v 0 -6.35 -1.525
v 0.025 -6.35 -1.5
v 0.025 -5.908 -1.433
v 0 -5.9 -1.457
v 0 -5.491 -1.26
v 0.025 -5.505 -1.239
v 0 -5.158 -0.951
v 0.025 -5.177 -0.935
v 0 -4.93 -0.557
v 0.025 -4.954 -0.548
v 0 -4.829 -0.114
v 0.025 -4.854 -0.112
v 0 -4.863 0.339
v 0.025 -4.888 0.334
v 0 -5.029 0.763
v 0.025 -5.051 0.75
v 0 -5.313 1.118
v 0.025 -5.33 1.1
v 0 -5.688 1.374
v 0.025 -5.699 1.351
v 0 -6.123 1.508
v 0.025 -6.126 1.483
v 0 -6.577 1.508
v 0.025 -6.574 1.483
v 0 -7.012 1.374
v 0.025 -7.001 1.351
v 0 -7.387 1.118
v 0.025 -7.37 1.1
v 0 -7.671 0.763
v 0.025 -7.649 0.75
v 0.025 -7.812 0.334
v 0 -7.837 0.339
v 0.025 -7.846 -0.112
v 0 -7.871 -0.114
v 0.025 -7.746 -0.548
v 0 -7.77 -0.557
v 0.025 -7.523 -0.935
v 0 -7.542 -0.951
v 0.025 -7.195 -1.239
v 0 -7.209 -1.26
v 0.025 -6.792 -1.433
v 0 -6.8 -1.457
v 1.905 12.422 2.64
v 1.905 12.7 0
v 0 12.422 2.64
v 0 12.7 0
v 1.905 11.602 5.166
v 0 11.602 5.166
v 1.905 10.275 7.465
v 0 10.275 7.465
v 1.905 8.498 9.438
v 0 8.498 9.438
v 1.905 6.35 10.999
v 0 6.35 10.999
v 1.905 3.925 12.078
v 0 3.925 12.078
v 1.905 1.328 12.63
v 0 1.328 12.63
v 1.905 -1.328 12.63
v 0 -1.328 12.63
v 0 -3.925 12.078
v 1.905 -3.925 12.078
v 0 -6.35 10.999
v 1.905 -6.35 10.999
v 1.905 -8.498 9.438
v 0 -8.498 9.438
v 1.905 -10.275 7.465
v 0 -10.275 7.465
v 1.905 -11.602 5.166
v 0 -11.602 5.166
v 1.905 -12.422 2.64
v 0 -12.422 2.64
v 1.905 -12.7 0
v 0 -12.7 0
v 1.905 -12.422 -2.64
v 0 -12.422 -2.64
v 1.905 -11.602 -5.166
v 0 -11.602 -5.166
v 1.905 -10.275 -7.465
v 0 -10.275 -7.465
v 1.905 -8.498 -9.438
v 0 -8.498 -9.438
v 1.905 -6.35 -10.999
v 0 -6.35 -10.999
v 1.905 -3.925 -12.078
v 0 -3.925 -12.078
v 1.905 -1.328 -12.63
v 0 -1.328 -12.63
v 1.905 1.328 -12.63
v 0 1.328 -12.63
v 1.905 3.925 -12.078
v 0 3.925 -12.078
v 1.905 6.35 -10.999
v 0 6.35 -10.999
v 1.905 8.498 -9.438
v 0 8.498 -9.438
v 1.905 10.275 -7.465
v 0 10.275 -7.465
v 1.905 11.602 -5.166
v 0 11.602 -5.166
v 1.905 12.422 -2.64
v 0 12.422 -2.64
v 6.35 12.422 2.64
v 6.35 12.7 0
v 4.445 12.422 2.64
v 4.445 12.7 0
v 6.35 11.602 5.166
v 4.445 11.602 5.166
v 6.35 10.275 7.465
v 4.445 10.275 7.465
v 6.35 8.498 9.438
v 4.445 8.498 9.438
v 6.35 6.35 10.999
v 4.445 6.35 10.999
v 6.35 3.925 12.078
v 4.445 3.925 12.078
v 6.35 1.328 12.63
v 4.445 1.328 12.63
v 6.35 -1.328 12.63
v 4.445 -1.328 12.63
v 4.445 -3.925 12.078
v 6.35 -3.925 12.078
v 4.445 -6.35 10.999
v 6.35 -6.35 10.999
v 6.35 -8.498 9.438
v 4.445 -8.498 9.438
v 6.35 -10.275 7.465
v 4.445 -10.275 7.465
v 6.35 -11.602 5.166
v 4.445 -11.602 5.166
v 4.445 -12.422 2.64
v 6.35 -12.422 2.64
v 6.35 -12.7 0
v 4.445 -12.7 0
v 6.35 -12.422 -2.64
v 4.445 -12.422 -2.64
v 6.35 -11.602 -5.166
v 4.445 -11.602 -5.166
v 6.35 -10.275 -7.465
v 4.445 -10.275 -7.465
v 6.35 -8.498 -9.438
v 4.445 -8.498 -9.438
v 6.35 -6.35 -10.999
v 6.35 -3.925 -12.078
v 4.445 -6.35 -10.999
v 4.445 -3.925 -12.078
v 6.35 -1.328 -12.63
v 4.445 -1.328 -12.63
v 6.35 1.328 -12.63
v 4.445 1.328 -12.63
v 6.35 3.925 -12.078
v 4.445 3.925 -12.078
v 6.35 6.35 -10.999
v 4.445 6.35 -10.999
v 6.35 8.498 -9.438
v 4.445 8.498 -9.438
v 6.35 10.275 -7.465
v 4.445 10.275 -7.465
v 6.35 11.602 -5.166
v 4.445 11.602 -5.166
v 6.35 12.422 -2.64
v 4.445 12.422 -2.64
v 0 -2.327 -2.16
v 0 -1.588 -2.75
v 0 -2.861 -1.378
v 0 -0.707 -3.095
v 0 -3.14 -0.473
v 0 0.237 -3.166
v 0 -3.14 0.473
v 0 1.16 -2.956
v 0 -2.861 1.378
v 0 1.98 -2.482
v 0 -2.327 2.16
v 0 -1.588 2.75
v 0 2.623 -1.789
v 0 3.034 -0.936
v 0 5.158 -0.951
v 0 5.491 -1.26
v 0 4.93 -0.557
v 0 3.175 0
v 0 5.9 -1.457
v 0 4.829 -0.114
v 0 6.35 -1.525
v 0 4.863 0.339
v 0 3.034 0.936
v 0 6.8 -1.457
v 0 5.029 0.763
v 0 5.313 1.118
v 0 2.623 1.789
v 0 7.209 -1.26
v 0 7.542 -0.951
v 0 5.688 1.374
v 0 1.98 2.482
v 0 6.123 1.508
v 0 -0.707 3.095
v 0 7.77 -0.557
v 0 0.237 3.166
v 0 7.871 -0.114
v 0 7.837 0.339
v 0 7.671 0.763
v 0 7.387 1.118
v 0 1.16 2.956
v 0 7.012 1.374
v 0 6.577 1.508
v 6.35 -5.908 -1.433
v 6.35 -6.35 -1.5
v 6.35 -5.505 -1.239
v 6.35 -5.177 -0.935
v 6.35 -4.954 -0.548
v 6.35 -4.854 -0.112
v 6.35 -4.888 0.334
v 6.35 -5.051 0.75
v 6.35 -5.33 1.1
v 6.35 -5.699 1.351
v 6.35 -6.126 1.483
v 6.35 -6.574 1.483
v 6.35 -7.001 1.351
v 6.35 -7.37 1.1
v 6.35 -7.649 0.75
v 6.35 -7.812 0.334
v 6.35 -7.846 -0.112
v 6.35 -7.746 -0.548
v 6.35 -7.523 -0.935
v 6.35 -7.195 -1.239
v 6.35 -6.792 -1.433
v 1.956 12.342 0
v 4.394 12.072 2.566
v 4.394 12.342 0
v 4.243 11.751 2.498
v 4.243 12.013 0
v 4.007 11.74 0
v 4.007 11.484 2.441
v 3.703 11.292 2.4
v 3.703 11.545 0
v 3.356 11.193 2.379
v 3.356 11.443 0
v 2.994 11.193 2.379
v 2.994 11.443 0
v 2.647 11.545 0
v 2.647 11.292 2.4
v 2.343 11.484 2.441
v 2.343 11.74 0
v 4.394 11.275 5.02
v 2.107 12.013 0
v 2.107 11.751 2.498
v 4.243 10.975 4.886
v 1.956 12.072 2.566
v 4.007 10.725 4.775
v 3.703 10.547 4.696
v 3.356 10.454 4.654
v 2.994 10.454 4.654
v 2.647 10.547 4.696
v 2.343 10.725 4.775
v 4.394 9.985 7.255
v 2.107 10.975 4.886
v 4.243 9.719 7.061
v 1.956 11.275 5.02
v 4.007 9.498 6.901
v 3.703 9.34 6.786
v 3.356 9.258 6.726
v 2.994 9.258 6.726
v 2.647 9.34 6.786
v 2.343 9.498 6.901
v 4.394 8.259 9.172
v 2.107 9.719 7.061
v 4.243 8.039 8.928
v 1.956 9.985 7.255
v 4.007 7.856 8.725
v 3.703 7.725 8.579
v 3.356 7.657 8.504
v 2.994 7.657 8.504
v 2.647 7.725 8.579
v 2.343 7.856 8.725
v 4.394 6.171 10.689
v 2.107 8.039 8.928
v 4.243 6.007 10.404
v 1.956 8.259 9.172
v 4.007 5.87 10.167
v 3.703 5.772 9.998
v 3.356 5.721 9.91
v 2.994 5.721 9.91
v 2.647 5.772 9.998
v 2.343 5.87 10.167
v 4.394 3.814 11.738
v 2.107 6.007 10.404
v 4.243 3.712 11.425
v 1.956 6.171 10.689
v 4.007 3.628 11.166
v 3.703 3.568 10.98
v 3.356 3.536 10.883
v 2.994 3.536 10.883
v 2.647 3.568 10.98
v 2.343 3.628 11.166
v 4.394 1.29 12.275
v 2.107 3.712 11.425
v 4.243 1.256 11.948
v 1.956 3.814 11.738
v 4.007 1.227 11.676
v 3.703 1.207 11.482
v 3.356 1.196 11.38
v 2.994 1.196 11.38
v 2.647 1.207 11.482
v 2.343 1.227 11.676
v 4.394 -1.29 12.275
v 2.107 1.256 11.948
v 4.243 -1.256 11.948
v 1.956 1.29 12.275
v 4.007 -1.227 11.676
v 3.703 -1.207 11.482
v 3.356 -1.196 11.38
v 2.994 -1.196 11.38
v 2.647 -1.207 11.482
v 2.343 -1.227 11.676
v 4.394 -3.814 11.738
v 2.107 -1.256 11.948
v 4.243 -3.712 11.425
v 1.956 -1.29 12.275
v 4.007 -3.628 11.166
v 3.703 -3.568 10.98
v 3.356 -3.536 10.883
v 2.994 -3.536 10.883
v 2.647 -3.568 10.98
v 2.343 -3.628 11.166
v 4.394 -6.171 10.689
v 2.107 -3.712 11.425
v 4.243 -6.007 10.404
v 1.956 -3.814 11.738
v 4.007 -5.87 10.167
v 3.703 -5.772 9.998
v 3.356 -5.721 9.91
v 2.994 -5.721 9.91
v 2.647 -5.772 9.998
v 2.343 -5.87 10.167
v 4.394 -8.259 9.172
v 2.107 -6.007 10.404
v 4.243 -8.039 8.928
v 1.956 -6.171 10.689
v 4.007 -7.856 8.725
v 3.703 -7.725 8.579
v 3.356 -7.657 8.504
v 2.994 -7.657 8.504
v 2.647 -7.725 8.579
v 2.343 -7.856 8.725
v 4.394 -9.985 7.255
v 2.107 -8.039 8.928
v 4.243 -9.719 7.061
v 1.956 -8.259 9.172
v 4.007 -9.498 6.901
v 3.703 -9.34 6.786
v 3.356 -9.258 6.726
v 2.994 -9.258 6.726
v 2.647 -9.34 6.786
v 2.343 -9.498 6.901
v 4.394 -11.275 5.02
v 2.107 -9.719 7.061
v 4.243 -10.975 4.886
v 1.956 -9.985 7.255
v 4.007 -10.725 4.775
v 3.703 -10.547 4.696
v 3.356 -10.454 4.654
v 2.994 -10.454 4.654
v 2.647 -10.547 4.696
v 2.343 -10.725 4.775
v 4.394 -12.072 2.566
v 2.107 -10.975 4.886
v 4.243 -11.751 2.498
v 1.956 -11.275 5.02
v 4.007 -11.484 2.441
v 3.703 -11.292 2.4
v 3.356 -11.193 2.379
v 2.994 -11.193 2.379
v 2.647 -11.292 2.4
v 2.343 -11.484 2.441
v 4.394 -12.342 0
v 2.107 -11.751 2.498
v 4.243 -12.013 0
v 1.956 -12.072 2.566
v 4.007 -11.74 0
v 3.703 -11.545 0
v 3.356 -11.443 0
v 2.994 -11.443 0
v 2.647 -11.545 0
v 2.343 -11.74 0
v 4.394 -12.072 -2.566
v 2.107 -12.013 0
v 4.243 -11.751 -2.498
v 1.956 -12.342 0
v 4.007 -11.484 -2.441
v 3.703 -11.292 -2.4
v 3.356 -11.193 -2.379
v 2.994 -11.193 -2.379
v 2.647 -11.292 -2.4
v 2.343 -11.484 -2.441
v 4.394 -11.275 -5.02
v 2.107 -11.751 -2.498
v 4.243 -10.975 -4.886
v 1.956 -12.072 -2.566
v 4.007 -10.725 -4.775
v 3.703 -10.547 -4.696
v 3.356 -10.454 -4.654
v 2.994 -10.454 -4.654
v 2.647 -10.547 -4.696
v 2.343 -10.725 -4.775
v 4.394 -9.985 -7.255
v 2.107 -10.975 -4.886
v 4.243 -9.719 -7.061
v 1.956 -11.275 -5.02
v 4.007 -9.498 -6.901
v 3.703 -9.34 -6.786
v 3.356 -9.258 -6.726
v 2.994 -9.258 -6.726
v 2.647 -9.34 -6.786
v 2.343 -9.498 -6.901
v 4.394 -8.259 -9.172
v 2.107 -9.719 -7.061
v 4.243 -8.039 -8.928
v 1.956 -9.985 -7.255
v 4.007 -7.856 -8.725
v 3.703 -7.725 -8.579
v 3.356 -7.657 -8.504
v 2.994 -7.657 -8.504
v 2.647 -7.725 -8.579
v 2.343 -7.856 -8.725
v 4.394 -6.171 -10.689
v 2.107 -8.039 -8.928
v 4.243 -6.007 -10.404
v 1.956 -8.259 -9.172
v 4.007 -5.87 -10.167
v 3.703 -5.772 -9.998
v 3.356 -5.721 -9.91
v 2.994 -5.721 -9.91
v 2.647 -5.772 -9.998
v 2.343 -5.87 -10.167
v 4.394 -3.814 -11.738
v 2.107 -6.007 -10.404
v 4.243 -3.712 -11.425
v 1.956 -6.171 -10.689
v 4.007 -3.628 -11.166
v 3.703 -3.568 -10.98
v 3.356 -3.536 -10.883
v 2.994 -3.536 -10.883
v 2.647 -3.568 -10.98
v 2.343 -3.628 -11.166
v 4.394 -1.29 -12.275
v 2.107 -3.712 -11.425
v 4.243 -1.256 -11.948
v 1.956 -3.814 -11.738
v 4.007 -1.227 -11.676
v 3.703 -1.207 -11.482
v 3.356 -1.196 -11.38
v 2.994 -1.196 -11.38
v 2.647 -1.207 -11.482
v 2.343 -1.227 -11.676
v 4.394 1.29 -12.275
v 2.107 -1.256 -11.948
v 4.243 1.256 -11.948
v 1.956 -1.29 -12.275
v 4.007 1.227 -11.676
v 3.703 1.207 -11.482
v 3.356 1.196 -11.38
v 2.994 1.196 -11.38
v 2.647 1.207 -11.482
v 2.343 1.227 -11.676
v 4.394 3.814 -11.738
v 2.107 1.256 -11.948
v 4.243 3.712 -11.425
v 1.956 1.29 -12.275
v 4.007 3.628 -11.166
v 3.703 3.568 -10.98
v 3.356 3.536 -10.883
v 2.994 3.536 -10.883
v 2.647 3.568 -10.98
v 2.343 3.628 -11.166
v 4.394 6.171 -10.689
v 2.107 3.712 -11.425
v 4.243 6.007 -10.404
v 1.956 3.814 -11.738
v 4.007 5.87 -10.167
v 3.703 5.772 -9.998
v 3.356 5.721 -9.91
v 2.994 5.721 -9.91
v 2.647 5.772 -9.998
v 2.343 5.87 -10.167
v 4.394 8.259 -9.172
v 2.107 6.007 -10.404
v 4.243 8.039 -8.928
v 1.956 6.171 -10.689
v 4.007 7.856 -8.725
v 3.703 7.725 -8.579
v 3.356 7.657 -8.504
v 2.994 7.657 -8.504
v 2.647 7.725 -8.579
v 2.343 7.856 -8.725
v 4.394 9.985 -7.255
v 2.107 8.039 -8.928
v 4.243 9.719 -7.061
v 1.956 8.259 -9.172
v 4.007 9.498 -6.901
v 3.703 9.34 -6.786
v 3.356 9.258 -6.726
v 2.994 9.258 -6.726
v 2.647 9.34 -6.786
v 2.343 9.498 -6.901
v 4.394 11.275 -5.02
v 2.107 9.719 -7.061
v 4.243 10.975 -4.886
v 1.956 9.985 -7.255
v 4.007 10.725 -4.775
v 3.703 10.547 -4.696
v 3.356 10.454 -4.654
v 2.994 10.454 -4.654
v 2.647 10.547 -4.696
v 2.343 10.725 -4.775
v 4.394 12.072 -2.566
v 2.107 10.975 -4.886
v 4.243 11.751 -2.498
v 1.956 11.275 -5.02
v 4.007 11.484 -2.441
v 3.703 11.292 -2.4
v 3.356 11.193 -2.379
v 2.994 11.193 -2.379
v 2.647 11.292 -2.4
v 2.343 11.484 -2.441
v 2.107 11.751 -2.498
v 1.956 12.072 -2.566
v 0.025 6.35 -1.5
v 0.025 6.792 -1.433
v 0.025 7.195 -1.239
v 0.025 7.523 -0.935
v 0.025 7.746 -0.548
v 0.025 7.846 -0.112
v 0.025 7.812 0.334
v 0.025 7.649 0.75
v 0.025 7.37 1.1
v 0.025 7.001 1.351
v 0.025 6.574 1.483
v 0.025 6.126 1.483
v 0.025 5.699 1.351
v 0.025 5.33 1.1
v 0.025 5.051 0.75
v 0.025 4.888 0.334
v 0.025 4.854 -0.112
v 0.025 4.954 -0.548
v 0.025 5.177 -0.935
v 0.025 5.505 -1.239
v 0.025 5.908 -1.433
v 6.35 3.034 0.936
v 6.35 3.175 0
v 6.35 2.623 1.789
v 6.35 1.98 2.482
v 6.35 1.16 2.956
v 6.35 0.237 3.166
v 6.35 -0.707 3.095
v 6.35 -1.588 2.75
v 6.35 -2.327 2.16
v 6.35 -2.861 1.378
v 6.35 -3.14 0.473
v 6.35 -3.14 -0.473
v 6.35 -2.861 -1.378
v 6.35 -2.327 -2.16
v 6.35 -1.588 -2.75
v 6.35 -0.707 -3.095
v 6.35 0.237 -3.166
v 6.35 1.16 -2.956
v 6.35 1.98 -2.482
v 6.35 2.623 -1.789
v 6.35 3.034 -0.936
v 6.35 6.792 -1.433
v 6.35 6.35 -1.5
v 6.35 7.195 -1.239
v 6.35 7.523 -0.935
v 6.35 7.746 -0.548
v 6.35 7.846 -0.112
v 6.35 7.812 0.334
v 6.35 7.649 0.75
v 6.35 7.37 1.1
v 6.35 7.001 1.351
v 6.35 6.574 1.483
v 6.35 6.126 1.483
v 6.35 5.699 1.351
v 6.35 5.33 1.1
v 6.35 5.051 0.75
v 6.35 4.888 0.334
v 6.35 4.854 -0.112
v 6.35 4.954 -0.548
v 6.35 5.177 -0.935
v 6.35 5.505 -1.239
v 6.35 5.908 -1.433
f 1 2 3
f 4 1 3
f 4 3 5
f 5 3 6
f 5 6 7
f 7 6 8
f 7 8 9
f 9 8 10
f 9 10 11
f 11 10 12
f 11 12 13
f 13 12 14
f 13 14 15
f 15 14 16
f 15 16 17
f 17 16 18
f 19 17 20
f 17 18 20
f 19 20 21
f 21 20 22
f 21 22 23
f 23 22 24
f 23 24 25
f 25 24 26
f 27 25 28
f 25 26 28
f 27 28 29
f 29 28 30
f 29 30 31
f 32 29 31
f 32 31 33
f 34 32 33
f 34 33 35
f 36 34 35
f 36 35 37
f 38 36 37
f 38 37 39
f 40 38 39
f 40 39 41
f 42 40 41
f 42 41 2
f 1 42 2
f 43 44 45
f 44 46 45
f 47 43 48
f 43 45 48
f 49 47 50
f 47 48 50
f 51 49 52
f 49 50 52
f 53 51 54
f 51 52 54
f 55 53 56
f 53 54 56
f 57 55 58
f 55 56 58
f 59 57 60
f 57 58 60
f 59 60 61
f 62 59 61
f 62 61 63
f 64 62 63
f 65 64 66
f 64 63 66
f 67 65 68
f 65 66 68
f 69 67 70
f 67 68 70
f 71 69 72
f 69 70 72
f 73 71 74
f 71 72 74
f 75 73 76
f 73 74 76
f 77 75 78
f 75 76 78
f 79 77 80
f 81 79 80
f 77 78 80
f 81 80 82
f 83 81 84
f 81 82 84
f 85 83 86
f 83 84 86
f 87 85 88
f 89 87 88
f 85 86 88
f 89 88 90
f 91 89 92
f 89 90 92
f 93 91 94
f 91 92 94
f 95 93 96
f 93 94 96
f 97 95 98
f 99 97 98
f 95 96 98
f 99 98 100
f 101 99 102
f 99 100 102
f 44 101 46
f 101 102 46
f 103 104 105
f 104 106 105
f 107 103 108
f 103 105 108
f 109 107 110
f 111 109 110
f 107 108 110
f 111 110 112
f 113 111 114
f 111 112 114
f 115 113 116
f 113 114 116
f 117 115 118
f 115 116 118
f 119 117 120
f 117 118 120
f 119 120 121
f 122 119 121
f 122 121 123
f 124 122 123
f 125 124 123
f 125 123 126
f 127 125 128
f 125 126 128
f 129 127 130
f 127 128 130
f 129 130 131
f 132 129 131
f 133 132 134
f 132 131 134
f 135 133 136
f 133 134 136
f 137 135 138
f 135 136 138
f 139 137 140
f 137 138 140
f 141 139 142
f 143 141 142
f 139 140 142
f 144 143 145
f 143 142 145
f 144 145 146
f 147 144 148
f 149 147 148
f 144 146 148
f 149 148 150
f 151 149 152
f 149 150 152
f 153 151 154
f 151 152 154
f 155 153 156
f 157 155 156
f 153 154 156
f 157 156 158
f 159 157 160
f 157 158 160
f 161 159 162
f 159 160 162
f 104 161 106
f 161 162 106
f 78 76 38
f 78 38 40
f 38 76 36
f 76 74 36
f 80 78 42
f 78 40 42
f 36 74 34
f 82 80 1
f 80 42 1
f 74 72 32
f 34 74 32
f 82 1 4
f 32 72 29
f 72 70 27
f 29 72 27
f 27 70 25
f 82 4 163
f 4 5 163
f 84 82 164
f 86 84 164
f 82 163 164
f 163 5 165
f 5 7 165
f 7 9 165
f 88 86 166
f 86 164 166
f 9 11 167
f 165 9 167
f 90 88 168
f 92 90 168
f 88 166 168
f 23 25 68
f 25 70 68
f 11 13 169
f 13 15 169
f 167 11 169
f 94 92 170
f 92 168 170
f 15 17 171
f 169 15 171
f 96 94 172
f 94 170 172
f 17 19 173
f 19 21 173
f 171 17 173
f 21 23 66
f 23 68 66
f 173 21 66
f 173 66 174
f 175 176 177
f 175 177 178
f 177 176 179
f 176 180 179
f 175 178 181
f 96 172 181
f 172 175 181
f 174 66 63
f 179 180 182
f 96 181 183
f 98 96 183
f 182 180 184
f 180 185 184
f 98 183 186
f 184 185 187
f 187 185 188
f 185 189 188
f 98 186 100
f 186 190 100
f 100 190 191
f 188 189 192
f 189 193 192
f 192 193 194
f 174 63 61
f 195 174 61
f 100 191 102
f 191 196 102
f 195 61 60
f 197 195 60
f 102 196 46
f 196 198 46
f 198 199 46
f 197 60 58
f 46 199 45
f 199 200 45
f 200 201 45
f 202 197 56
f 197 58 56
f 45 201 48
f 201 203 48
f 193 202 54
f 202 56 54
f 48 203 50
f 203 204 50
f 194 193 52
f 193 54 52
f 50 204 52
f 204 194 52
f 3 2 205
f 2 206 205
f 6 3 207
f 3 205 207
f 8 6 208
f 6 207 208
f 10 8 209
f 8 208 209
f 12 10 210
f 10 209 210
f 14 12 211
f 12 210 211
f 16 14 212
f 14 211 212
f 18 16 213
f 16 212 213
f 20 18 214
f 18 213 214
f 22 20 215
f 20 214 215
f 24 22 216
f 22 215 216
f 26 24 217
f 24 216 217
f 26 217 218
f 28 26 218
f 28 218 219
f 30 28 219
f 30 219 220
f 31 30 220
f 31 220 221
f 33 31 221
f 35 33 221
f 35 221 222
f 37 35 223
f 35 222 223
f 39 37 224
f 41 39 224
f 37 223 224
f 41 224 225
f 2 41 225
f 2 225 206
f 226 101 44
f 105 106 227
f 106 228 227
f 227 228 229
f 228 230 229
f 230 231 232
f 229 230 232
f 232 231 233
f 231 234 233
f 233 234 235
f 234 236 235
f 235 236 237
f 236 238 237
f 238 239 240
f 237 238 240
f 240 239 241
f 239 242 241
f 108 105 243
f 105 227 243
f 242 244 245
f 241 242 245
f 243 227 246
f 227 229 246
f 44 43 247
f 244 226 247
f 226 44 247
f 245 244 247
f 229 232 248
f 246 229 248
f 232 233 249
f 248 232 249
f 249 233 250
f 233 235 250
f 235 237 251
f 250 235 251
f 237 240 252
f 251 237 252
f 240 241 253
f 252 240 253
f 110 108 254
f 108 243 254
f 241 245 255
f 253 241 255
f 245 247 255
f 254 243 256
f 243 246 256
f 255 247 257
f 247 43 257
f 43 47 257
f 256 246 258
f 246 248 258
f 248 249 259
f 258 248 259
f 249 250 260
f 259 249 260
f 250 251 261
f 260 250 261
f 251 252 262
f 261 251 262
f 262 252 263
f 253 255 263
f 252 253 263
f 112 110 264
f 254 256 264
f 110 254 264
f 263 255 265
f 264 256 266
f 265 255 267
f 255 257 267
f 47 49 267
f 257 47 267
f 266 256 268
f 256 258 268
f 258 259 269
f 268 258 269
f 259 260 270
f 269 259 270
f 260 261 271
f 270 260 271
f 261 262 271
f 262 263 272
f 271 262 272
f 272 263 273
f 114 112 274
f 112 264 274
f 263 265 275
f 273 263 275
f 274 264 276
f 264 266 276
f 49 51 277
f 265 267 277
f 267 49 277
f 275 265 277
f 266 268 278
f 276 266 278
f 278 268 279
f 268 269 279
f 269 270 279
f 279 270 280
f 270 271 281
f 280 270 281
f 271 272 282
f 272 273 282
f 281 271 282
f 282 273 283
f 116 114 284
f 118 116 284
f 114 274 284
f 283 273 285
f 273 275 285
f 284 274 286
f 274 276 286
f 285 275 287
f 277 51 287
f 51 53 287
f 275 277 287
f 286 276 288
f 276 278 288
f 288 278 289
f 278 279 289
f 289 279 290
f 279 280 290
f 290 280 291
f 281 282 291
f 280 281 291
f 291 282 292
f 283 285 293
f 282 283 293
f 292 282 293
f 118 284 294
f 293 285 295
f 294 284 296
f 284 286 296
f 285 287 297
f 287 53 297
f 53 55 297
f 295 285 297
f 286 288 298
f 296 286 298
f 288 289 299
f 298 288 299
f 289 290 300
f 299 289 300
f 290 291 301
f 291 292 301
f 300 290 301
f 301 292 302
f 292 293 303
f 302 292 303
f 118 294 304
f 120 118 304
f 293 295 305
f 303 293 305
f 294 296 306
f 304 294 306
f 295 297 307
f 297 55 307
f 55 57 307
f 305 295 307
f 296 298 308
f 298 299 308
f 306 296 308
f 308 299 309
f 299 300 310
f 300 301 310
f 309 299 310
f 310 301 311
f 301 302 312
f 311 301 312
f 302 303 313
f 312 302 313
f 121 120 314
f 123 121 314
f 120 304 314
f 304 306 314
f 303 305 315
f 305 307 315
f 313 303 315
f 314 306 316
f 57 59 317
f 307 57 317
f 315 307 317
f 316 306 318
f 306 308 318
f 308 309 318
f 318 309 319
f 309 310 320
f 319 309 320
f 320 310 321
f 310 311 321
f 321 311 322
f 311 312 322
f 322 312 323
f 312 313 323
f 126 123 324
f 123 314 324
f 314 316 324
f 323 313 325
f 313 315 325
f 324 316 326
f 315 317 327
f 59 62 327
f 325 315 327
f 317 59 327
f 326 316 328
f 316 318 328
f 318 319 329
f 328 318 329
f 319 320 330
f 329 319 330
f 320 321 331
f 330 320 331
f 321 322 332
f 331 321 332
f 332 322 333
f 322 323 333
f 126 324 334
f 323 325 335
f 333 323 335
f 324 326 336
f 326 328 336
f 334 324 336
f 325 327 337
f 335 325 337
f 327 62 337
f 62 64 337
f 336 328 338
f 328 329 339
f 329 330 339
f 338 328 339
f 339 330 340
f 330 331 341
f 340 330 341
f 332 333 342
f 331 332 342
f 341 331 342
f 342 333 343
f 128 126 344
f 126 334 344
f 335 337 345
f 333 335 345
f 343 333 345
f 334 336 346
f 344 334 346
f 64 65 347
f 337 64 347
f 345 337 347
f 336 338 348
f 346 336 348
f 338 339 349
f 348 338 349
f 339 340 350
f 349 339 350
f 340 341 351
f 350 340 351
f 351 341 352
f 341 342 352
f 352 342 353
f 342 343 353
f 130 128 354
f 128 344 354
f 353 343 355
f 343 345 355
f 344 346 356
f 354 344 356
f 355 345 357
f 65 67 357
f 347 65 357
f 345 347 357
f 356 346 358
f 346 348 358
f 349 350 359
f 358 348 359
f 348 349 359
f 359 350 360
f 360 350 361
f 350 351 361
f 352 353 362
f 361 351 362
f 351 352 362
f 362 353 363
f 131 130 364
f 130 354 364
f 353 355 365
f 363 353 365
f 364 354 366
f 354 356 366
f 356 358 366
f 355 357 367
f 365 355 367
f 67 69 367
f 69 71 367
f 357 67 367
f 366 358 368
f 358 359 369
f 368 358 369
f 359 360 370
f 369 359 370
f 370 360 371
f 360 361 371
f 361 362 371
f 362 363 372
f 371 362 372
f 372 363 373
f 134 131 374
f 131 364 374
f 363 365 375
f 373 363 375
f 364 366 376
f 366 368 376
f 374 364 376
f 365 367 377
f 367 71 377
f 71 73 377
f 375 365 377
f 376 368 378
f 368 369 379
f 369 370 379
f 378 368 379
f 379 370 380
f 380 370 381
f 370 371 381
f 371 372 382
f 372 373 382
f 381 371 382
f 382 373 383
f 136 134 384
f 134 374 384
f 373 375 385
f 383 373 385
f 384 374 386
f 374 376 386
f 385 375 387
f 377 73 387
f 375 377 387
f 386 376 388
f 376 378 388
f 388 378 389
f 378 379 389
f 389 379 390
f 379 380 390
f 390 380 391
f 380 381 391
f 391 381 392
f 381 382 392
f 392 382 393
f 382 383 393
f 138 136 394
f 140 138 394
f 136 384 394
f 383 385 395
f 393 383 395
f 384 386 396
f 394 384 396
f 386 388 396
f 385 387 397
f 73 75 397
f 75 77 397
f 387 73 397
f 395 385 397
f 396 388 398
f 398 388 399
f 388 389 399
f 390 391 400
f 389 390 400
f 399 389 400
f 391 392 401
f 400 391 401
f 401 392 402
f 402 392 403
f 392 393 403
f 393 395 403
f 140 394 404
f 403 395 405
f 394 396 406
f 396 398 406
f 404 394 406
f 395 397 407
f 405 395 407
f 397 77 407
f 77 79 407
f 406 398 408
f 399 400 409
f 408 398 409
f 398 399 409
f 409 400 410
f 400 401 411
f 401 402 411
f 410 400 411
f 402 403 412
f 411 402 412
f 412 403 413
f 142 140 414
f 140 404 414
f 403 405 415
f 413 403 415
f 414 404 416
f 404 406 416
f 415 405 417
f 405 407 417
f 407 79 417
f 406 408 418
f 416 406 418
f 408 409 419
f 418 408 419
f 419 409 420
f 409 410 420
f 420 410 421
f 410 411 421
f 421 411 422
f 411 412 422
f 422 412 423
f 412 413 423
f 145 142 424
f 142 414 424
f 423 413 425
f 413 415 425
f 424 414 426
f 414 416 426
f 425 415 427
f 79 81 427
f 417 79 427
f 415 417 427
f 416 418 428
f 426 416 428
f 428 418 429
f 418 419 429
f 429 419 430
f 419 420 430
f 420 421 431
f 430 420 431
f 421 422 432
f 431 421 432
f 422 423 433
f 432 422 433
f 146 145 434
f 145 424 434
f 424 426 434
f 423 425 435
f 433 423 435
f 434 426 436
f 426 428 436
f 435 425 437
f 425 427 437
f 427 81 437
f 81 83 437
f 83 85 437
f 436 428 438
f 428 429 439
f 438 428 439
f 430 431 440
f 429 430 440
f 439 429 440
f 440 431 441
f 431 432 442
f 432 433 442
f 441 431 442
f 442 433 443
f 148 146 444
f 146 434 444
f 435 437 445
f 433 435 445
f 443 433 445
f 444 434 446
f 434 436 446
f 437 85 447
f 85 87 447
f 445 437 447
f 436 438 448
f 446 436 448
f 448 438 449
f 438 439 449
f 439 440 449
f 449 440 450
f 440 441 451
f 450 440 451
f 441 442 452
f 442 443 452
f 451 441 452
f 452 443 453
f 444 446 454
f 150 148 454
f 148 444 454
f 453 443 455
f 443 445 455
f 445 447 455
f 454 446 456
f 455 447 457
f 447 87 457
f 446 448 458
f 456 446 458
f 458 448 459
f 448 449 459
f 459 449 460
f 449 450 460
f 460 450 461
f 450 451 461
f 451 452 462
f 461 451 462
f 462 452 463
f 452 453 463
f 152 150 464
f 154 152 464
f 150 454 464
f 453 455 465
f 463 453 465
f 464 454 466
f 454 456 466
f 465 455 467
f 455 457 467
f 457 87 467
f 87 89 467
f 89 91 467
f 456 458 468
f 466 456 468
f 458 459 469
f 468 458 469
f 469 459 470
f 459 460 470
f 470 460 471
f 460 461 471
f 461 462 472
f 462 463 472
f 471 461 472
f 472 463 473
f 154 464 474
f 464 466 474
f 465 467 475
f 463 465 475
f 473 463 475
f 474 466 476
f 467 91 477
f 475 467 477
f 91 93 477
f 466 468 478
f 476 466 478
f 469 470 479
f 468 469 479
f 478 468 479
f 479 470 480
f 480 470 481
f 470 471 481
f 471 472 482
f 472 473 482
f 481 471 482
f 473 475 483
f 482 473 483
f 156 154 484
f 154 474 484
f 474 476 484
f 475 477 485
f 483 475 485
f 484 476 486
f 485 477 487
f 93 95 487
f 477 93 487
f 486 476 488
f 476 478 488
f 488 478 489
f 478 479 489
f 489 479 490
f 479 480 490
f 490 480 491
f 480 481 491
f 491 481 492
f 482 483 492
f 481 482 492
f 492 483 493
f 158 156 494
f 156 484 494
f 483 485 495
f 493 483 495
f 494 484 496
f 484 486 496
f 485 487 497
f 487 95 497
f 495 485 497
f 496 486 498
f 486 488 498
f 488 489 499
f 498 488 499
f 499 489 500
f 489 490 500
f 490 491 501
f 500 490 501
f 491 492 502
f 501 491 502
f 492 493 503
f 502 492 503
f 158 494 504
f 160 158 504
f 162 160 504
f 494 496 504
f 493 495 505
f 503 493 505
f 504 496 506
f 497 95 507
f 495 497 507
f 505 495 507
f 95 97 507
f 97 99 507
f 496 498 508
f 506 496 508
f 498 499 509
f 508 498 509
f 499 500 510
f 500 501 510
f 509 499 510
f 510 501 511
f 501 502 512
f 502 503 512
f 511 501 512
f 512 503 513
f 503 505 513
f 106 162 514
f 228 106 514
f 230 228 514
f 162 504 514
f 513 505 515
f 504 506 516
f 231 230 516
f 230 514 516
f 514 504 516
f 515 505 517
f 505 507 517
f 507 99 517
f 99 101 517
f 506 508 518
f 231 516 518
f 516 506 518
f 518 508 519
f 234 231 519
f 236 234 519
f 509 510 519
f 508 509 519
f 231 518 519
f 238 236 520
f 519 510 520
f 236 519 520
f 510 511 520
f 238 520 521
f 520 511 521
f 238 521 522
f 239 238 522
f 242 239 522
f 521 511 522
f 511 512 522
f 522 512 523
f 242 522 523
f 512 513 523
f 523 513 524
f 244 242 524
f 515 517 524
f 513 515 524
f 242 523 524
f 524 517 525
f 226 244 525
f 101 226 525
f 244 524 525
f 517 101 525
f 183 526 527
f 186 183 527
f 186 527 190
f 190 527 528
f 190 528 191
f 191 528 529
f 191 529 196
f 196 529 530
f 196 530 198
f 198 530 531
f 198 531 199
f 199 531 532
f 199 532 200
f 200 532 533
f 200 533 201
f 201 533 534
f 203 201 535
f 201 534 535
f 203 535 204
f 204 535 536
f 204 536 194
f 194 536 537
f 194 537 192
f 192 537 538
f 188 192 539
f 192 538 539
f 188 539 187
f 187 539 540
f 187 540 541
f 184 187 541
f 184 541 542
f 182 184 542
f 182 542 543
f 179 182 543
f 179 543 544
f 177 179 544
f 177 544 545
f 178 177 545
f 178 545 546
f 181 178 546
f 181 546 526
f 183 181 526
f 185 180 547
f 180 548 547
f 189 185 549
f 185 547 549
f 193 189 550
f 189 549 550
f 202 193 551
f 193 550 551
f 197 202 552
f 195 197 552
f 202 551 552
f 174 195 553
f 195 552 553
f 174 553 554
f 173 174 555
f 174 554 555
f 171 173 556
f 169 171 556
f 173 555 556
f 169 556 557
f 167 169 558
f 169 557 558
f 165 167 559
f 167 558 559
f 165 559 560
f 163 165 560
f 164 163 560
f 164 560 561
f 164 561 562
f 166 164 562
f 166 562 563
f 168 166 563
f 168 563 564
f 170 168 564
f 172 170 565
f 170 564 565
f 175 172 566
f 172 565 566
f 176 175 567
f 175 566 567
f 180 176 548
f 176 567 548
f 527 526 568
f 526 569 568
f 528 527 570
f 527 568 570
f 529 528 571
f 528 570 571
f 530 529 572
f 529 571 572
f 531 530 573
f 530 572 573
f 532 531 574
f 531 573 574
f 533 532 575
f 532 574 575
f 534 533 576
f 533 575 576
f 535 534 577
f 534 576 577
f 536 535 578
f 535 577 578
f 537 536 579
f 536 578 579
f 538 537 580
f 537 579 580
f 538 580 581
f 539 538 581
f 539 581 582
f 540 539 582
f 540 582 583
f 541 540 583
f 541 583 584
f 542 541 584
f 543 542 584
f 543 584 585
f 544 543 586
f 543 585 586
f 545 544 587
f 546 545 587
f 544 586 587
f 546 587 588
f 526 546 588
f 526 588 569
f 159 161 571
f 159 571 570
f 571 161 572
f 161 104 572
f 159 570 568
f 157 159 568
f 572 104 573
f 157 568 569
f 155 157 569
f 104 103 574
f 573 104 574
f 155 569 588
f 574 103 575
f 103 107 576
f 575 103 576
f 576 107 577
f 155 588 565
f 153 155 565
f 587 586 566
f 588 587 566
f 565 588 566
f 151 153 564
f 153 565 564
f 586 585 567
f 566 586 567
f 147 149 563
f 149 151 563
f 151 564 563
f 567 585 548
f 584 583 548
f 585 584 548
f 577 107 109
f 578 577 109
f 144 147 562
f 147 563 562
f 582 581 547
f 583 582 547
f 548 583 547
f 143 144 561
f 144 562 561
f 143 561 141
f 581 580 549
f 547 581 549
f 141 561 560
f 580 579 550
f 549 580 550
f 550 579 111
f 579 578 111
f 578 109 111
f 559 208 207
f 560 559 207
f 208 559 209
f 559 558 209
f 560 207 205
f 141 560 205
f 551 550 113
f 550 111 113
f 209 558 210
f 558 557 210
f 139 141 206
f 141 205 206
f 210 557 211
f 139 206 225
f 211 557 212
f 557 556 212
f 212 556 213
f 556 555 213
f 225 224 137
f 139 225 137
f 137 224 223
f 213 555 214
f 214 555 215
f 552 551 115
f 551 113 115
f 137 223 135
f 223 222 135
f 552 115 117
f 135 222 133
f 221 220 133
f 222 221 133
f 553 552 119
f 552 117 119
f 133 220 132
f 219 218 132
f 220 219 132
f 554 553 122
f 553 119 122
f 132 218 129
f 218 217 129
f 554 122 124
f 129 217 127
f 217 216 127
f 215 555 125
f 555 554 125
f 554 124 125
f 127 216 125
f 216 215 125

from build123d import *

# Parameters (mm, degrees)
F_3_0MM_DOWEL_HOLE1_D           = 3
F_3_0MM_DOWEL_HOLE1_CSINK_D     = 3.05
F_3_0MM_DOWEL_HOLE1_CSINK_ANGLE = 90


with BuildPart() as part:
    # Sketch1 → Revolve1 (revolve)
    with BuildSketch(Plane.XY):
        with BuildLine():
            Line((0, 3.175), (6.35, 3.175))
            Line((6.35, 3.175), (6.35, 12.7))
            Line((6.35, 12.7), (4.445, 12.7))
            ThreePointArc((4.445, 12.7), (3.175, 11.43), (1.905, 12.7))
            Line((1.905, 12.7), (0, 12.7))
            Line((0, 12.7), (0, 3.175))
        make_face()
    revolve(axis=Axis((0, 0, 0), (1, 0, 0)))

    # Ø3.0mm Dowel Hole1 (through all)
    with Locations(Plane.ZY):
        with Locations((0, 6.35), (0, -6.35)):
            CounterSinkHole(F_3_0MM_DOWEL_HOLE1_D / 2, F_3_0MM_DOWEL_HOLE1_CSINK_D / 2, counter_sink_angle=F_3_0MM_DOWEL_HOLE1_CSINK_ANGLE)


solid = part.part
